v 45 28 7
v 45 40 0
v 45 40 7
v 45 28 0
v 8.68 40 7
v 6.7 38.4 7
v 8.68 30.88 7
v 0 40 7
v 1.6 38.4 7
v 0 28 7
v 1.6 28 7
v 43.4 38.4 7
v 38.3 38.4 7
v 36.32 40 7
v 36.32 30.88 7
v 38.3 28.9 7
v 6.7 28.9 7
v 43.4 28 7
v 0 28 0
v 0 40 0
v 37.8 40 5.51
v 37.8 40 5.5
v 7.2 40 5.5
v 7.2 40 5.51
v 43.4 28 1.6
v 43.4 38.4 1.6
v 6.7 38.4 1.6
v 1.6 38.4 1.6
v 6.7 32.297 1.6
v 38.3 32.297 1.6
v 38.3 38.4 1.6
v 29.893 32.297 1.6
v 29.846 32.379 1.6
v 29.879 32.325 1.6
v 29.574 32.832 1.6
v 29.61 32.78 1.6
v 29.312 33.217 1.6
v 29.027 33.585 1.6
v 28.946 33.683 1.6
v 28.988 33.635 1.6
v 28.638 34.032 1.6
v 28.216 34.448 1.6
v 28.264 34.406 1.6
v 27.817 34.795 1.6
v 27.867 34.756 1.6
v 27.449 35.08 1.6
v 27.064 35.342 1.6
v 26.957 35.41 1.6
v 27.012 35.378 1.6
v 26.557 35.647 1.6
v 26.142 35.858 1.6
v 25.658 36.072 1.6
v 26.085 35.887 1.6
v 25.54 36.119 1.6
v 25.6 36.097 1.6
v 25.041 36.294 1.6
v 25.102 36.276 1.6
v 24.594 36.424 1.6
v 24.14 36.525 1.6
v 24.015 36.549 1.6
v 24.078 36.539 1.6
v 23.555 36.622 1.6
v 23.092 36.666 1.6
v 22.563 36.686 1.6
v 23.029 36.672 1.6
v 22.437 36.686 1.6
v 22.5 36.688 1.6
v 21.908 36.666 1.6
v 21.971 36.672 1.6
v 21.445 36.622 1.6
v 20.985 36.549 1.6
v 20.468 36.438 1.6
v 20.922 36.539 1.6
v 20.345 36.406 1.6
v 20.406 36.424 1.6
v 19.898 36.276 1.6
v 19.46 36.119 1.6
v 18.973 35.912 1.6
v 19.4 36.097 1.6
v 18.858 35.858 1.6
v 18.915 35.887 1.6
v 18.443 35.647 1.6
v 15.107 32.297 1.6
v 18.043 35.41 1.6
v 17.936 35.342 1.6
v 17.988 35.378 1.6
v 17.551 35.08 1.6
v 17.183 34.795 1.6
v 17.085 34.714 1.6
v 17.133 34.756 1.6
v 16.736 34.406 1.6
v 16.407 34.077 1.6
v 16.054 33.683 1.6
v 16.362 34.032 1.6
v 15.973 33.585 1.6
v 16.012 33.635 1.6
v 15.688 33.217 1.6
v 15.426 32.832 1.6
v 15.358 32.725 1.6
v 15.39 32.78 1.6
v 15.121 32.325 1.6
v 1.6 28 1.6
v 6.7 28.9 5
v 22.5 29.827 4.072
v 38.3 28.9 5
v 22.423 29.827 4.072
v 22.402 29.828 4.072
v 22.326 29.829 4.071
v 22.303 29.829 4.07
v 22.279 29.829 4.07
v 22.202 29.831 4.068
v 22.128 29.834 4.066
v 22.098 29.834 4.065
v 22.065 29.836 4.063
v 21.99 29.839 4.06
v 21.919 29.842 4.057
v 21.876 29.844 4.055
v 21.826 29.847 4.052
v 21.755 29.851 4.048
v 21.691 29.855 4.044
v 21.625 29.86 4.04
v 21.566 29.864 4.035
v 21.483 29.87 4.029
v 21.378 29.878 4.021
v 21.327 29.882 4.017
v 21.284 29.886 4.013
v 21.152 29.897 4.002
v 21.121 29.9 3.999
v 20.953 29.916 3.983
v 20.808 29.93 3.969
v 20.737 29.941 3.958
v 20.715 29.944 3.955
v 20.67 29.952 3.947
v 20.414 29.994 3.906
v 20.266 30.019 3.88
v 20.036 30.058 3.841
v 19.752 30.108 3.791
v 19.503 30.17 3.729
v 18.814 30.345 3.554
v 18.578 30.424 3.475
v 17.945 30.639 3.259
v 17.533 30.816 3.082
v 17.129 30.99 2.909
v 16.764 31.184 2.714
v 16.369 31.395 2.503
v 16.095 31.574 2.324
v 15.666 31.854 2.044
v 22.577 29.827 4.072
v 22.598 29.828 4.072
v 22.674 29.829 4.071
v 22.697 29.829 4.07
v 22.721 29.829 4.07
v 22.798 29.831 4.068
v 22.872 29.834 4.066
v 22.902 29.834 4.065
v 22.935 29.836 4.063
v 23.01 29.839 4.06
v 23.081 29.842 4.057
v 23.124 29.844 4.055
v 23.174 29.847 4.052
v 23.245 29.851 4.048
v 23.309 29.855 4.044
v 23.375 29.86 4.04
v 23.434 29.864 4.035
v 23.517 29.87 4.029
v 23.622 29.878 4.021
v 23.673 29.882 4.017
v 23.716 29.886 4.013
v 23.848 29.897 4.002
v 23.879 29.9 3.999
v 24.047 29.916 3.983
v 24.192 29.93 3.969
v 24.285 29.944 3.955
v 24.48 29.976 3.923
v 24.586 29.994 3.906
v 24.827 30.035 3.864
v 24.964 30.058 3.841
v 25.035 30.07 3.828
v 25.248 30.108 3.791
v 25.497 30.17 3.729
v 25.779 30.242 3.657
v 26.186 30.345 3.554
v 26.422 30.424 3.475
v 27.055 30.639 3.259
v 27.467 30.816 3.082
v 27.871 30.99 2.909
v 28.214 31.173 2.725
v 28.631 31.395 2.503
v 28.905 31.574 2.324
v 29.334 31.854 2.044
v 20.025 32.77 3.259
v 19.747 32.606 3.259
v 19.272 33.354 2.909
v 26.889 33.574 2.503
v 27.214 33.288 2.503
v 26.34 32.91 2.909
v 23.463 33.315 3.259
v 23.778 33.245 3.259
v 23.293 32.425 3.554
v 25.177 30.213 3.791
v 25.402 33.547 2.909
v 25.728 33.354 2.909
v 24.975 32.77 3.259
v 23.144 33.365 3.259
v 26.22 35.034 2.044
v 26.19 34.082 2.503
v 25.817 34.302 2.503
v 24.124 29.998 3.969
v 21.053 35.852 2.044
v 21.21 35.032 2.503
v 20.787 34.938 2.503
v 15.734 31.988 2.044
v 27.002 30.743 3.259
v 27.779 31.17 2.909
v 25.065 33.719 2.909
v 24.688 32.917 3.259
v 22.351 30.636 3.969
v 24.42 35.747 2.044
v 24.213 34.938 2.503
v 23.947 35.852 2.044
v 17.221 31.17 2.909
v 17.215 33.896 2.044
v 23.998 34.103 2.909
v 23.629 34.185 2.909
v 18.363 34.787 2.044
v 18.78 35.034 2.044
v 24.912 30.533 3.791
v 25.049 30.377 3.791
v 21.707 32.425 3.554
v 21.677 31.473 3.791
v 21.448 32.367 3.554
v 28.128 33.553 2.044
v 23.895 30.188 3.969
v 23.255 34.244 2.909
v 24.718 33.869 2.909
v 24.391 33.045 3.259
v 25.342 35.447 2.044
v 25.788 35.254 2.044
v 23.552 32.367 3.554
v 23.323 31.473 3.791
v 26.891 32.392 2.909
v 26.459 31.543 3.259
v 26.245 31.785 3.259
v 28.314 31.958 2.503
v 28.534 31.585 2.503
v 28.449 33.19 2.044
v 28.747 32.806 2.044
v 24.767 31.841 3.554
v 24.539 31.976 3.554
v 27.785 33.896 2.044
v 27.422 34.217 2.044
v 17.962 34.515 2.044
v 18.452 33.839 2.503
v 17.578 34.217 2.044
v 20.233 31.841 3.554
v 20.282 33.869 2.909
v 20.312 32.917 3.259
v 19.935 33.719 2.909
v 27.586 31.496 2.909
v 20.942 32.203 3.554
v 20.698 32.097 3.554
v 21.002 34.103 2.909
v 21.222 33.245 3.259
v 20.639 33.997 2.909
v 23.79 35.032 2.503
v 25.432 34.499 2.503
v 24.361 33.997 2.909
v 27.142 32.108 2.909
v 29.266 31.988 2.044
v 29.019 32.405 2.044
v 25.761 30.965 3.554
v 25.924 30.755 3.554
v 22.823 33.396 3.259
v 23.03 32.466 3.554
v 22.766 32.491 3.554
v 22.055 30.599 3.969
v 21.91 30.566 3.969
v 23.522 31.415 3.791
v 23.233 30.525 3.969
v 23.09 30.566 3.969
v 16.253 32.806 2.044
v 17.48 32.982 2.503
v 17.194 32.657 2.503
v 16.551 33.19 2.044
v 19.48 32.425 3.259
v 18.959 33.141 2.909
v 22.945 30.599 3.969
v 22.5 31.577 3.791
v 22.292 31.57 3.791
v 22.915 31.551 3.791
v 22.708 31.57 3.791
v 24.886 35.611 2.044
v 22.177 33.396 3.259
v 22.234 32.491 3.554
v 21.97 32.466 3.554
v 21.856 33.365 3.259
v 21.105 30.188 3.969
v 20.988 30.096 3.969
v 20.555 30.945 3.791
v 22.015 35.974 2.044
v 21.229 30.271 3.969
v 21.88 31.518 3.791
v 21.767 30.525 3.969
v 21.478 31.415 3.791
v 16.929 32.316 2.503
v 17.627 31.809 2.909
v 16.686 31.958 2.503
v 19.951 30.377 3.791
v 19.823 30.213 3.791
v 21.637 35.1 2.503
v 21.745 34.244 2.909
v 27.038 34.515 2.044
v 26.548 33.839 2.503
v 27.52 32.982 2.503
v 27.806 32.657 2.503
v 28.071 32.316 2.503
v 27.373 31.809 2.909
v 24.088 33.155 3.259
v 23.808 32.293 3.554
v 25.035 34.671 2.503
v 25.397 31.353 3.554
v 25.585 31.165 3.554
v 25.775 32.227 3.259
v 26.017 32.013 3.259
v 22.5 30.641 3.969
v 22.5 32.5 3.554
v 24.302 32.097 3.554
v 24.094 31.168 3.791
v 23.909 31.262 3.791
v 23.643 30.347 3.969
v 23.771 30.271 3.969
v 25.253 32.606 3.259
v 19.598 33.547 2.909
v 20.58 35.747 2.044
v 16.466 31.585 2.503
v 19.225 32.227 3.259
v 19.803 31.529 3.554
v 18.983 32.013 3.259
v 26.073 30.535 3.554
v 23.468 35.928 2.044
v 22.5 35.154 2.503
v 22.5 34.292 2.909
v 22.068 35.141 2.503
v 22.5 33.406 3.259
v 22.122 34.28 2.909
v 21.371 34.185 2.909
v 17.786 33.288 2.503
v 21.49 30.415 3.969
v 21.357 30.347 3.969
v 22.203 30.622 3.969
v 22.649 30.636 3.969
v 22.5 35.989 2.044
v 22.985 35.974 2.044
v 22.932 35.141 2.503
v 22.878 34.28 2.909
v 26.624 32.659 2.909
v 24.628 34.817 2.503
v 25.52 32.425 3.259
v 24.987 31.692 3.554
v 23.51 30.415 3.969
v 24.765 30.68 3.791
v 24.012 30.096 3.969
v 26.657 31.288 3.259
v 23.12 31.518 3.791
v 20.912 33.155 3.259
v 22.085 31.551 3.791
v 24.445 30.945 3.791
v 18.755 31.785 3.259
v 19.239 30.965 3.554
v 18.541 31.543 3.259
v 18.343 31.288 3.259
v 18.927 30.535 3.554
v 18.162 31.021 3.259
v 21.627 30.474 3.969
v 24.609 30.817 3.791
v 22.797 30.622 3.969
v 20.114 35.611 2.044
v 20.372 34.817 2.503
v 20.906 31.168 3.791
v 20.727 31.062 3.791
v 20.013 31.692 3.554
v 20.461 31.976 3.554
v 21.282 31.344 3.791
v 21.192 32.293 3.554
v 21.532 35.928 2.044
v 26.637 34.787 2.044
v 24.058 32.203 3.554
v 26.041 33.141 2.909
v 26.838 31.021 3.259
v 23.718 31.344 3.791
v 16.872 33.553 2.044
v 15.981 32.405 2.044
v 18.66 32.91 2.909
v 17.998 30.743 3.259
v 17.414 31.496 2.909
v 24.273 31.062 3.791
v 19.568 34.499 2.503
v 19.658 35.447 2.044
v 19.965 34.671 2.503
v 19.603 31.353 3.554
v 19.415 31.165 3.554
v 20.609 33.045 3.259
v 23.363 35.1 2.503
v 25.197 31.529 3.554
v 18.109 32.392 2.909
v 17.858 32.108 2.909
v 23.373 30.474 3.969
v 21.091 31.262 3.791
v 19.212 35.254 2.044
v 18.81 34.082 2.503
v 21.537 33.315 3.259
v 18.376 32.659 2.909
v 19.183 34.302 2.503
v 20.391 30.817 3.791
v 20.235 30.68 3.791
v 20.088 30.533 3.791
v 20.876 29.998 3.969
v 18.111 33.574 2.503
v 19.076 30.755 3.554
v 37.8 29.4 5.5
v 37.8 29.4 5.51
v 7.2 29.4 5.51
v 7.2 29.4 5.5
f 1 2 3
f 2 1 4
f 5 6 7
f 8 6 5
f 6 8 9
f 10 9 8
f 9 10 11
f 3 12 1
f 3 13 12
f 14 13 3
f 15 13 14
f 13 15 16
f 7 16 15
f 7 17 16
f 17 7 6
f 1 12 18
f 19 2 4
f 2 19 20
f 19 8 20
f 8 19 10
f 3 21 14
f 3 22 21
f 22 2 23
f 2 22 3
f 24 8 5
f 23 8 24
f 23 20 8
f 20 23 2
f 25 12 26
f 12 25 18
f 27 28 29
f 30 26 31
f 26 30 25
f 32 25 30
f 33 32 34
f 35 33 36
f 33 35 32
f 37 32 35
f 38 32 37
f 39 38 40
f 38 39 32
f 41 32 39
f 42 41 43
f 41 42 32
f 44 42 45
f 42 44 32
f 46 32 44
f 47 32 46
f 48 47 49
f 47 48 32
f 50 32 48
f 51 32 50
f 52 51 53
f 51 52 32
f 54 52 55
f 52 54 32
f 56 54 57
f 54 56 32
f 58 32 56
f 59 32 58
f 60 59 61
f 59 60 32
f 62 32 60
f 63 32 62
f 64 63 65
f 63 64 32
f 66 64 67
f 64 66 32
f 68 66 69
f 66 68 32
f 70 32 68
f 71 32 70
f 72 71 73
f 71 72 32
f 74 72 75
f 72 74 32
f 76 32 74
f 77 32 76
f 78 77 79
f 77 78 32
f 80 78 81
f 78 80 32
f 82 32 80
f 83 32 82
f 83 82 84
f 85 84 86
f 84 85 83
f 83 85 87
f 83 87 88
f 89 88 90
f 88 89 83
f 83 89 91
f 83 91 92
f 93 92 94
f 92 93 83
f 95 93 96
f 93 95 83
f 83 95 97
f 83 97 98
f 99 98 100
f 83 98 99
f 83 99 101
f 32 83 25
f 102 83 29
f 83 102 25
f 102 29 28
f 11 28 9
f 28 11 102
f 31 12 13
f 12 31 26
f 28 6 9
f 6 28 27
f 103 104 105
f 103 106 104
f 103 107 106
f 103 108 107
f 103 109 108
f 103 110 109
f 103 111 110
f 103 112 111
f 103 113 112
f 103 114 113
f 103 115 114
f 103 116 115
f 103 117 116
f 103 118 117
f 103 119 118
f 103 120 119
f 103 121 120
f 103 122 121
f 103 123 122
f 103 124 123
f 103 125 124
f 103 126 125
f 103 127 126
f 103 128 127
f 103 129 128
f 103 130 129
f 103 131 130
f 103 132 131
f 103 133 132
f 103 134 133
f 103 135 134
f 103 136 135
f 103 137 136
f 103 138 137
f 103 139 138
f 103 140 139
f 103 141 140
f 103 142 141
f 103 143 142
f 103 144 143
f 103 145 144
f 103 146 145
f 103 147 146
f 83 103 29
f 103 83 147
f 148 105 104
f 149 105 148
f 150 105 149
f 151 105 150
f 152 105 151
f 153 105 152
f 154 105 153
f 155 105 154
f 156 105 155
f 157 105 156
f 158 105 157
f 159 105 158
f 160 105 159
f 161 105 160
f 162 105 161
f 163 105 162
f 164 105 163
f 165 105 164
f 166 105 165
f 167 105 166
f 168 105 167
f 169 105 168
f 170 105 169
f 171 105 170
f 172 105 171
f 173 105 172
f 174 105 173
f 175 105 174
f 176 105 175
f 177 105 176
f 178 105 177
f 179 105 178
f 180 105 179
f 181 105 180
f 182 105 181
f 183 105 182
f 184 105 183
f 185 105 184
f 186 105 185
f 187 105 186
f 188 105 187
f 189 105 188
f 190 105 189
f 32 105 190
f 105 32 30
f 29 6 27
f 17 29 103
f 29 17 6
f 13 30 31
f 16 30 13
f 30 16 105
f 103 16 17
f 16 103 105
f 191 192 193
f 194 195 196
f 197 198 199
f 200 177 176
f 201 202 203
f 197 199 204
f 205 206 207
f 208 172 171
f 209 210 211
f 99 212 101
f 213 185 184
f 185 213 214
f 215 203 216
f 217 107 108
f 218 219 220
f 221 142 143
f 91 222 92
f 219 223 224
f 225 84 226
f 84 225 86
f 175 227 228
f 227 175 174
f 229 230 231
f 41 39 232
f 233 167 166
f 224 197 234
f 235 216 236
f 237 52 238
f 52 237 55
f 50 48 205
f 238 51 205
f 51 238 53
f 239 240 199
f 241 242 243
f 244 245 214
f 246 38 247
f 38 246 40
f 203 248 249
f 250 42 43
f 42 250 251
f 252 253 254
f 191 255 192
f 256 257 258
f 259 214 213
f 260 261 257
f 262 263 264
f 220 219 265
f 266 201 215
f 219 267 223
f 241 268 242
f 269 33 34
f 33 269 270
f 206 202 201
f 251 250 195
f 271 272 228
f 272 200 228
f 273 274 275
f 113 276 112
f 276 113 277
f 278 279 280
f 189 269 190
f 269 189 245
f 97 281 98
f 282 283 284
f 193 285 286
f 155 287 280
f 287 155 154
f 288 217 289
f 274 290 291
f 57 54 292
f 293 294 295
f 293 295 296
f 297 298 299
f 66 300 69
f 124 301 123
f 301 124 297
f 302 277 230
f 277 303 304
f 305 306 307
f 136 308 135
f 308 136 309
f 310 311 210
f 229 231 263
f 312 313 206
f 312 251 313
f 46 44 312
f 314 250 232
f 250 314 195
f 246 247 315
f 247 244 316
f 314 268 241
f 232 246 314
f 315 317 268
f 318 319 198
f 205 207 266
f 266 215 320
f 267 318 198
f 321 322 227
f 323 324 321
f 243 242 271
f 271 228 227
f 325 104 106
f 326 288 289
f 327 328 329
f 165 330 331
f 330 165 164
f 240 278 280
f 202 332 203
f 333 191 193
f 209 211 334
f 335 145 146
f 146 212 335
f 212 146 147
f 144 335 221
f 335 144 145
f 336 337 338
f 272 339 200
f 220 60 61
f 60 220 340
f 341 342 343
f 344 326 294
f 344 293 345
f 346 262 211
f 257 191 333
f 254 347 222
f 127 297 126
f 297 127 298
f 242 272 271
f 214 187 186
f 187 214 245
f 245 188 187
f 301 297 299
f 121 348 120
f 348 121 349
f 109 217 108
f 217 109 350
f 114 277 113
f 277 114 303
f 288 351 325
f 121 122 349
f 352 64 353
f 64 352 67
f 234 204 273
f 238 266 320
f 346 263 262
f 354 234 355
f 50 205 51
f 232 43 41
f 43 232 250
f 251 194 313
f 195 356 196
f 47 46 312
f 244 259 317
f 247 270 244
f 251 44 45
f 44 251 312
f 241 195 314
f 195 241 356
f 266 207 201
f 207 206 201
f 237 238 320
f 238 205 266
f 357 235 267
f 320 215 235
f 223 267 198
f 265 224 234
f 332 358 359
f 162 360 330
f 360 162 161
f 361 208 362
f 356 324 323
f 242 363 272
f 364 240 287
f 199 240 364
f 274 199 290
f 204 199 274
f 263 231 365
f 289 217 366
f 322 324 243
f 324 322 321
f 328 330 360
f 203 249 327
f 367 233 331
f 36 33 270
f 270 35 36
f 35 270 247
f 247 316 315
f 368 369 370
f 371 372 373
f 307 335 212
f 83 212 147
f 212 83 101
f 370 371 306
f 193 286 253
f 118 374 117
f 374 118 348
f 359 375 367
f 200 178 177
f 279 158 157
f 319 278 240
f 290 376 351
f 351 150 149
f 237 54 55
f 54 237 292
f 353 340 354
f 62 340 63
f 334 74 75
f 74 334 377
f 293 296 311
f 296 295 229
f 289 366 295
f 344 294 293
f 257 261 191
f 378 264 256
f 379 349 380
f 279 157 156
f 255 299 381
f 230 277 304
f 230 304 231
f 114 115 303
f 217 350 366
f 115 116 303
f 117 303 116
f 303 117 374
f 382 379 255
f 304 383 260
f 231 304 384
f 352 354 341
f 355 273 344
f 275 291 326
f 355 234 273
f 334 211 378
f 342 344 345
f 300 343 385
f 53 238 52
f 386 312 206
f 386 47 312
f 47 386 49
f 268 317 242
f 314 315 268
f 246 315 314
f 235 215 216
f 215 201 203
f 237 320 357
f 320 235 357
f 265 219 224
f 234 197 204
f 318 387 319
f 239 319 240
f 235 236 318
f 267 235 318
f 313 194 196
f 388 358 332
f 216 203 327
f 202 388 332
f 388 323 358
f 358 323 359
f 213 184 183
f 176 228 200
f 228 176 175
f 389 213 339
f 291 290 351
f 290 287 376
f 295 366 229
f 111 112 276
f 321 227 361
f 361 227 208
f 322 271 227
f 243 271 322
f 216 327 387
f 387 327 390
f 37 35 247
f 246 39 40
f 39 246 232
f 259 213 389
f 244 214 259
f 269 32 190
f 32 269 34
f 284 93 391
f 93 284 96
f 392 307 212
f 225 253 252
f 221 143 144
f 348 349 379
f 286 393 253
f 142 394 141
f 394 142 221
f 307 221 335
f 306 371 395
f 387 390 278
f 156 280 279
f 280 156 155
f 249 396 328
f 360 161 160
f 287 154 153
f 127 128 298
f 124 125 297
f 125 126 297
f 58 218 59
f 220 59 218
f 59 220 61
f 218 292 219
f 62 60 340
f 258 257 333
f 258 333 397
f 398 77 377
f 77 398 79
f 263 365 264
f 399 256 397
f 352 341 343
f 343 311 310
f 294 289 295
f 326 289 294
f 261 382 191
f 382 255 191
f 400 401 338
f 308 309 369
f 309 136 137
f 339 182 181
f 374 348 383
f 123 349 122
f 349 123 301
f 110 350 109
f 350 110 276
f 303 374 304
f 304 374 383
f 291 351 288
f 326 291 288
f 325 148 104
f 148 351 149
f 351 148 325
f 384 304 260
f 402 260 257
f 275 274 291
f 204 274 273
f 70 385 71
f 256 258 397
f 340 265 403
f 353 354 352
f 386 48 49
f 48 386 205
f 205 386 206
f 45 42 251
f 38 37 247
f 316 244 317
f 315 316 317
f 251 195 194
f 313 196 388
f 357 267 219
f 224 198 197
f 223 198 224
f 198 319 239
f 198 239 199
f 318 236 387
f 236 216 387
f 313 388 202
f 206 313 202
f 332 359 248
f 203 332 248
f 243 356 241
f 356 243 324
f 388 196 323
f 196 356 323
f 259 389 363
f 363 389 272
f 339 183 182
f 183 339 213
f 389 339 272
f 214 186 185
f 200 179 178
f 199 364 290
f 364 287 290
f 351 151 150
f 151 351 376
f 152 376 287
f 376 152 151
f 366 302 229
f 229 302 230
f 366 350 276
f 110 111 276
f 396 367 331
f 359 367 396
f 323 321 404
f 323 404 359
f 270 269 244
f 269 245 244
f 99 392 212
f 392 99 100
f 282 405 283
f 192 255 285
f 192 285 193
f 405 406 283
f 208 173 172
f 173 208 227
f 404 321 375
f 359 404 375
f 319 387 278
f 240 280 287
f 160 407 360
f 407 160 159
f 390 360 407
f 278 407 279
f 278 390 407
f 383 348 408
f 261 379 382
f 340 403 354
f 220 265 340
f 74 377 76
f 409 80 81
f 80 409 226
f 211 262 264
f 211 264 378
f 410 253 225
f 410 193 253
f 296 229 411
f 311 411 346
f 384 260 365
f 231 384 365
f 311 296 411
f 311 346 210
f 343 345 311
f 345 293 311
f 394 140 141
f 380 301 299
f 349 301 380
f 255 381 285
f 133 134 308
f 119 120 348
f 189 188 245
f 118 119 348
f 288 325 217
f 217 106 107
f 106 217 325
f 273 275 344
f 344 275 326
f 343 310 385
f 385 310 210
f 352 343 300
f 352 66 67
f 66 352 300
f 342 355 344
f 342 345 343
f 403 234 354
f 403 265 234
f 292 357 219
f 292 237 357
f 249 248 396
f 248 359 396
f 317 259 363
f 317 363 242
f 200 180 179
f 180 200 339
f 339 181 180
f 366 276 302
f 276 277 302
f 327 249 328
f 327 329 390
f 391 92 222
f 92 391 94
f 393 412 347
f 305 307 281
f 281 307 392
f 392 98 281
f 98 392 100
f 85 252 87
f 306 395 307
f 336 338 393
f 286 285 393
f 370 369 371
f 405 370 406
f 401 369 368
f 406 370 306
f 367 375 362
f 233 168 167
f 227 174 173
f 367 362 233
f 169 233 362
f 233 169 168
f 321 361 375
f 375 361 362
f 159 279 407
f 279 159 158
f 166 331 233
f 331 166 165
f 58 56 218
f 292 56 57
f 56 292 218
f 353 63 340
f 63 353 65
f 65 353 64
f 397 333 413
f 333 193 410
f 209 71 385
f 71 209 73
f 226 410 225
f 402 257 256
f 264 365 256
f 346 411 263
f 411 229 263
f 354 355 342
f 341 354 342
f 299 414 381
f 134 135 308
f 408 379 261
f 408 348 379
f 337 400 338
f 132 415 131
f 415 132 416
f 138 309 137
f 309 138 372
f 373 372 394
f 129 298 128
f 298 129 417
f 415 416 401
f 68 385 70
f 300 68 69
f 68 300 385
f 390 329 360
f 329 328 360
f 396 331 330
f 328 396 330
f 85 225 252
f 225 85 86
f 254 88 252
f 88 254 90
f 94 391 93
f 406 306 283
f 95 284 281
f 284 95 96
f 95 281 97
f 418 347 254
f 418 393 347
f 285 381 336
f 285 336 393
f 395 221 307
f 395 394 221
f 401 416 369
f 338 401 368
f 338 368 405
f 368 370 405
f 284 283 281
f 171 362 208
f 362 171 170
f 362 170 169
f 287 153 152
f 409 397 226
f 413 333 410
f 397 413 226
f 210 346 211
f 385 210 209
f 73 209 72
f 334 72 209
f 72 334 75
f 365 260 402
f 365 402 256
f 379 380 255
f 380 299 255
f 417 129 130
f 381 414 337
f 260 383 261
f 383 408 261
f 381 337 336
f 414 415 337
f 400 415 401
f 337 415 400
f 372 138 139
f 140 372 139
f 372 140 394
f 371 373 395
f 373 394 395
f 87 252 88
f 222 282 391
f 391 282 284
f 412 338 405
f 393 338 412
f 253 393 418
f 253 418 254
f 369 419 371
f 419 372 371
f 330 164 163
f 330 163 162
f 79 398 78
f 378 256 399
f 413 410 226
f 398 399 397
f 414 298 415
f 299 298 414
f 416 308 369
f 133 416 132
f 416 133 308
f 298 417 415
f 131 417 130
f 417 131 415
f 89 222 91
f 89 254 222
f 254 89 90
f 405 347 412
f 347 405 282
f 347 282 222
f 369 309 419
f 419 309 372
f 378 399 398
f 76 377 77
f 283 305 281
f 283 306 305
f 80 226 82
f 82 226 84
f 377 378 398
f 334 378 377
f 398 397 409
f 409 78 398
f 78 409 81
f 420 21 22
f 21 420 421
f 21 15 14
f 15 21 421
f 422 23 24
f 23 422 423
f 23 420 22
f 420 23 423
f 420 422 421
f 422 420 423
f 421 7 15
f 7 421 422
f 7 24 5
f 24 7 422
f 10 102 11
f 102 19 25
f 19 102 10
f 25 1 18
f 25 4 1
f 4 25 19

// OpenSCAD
// file: bezier.scad
deltat = 0.05;
    
function cubic_bezier(p0,p1,p2,p3) = [for (t=[0:deltat:1+deltat]) pow(1-t,3)*p0+3*pow((1-t),2)*t*p1+3*(1-t)*pow(t,2)*p2+pow(t,3)*p3];

function project_point(pa, pb) =
    [for (i = [0:1]) pb[i]+(pb[i]-pa[i])];
    
module polyline(points, index, w) {
    if(index < len(points)) {
        line(points[index - 1], points[index],w);
        polyline(points, index + 1, w);
    }
}

module line(p1,p2,w) {
    hull() {
        translate(p1) circle(r=w,$fn=20);
        translate(p2) circle(r=w,$fn=20);
    }
}
// main file
include <bezier.scad>;

$fn=50;
solid_thick = 10;

length_min = 348;
length_mid = 351;
length_max = 355;

length_min_offset = length_max - length_min;
length_mid_offset = length_max - length_mid;
width = 235;
handle_side_min = 50;
handle_side_max = 60;
depth = 70;
fix = 0.01;
gap = 0.6;



module reduce(padding) {
    
    difference() {
        children();
        minkowski() {        
            difference() {
                minkowski() {
                    children();
                    cylinder(r=padding, height=padding, center=true);
                };
                children();
            };
            cylinder(r=padding, height=fix, center=true);
        }
    }
}

module reduce_y(padding) {
    difference() {
        children();
        minkowski() {        
            difference() {
                minkowski() {
                    children();
                    cylinder(r=padding, height=padding, center=true);
                };
                children();
            };
            cube([fix, padding*2, fix], center=true);
        }
    }
}

module solid() {
    translate([-solid_thick,-solid_thick, -solid_thick])
    cube([width+solid_thick*2,length_max+solid_thick*2, depth + solid_thick]);
}

module void() {
    translate([20, length_min_offset,0])
    cube([width-40, length_min-20, depth+fix]);
  
    translate([0, length_min_offset+20,0])
    cube([width, length_min-20, depth+fix]);
      
}


p0 = [handle_side_min,0];
p1 = [handle_side_min+5,0];
p2 = [handle_side_max-5,length_min_offset];
p3 = [handle_side_max,length_min_offset];


module smooth() {
    linear_extrude(height=depth+10+fix*3)
    polygon(concat(
        cubic_bezier(
            [0,length_mid_offset+1],
            [0,length_mid_offset-1],           
            [handle_side_min-10,0],
            [handle_side_min,0]
        ),
        cubic_bezier(
            [handle_side_min,0],
            [handle_side_min+5,0],
            [handle_side_max-5,length_min_offset],
            [handle_side_max,length_min_offset]    
        ),
        [
            [handle_side_max+10,length_min_offset],
            [handle_side_max+10,length_min_offset+70],
            [0,length_min_offset+70]
        ])
    );
}

module smooth_old() {
    linear_extrude(height=depth+fix)
    polygon(concat([
            [0,length_mid_offset]
        ],
        cubic_bezier(
            [handle_side_min,0],
            [handle_side_min+5,0],
            [handle_side_max-5,length_min_offset],
            [handle_side_max,length_min_offset]    
        ),
        [
            [handle_side_max+10,length_min_offset],
            [handle_side_max+10,length_min_offset+10],
            [0,length_min_offset+10]
        ])
    );
}

module cassetto() {
    difference() {
        solid();
        void();
        smooth();
        translate([width,0,0])
        mirror([1,0,0])
        smooth();
    }
}

    


box_length = 50;
box_width = 50;
box_depth = 50;
box_bottom_thick = 1.6;
box_wall_thick = 1.6;

box_hang_label_width = 30;
box_hang_label_length = 10;
box_hang_label_margin = 2;
box_hang_play = 0.3;
box_hang_eps = 1.5;
box_hang_width = box_hang_label_width+box_hang_label_margin*2-box_hang_eps*2+box_hang_play*2;
box_hang_length = box_hang_label_length+box_hang_label_margin-box_hang_eps+box_hang_play*2;
box_hang_thick = 2;




module box_hang_solid() {
    difference() {
        hull() {
            translate([0,0,-box_hang_thick])
            cube([box_hang_width,box_hang_length,box_hang_thick]);
            translate([0,box_hang_length-fix, -box_hang_thick-box_hang_length])
            cube([box_hang_width,fix,fix]);
        };
        translate([box_hang_width/2,-box_hang_width*0.02,-box_hang_width*0.57])
        sphere(box_hang_width*0.48, $fn=100); 
    }
}

module box_hang_void() {
    hull() {
        translate([box_hang_label_margin, +box_hang_label_margin,fix])
        cube([box_hang_width-box_hang_label_margin*2, box_hang_length, fix]);
        translate([
            box_hang_label_margin-box_hang_eps,
            +box_hang_label_margin-box_hang_eps,
            -box_hang_eps
        ])
        cube([
            box_hang_width-box_hang_label_margin*2+box_hang_eps*2,
            box_hang_length,
            fix
        ]);    
    }
}

module box_hang() {
    difference() {
        box_hang_solid();
        box_hang_void();
    }
}

module box_main(box_width, box_length, box_depth) {
    difference() {
        cube([box_width, box_length, box_depth]);

        translate([box_wall_thick,box_wall_thick,box_bottom_thick])
        cube([box_width-box_wall_thick*2, box_length-box_wall_thick*2, box_depth]);
    };
}

module box_main_outer(box_width, box_length, box_depth) {
    module solid() {
        intersection() {
            translate([gap,-gap,0])
            cube([box_width, box_length, box_depth]);
            reduce(gap)
            smooth();
        }
    }
    
    translate([-gap,gap,0])
    difference() {
        solid();

        translate([0,0,box_bottom_thick])
        reduce(box_wall_thick)
        solid();    
    };
}



module box(box_width, box_length, box_depth) {
    module move_hang() {
        translate([
            (box_width-box_hang_width)/2,
            box_length-box_hang_length,
            box_depth
        ])
        children();
    }

    
    difference() {
        union() {
            box_main(box_width, box_length, box_depth);
            move_hang()
            box_hang_solid();
        };
        move_hang()
        box_hang_void();
    }
}

module box_outer(box_width, box_length, box_depth) {
    module move_hang() {
        translate([
            (box_width-box_hang_width)/2,
            box_length-box_hang_length,
            box_depth
        ])
        children();
    }

    
    difference() {
        union() {
            box_main_outer(box_width, box_length, box_depth);
            move_hang()
            box_hang_solid();
        };
        move_hang()
        box_hang_void();
    }
}

box_width_25 = (width-gap*5)/4;
box_length_20 = (length_max-gap*6)/5;

box_length_20_bc = length_min-gap*6-box_length_20*4 - gap;

module box_grid() {
    
    for ( i = [0:3]) {
        for ( j = [0:3]) {
            x_shift = gap+(box_width_25+gap)*j;
            y_shift = gap+(box_length_20+gap)*i;
            
            translate([x_shift, length_max-box_length_20-y_shift,0])
            box(box_width_25, box_length_20, depth);
        }
    }
    x1_shift = gap+(box_width_25+gap)*0;
    y1_shift = gap+(box_length_20+gap)*4;
    
    translate([x1_shift, length_max-box_length_20-y1_shift,0])
    box_outer(box_width_25, box_length_20, depth);
    
    x2_shift = gap+(box_width_25+gap)*3;
    y2_shift = gap+(box_length_20+gap)*4;
    
    translate([box_width_25+x2_shift, length_max-box_length_20-y2_shift,0])
    mirror([1,0,0])
    box_outer(box_width_25, box_length_20, depth);
    
    x3_shift = gap+(box_width_25+gap)*1;
    y3_shift = gap+(box_length_20+gap)*4;
    
    translate([x3_shift, length_max-box_length_20_bc-y3_shift,0])
    box(box_width_25, box_length_20_bc, depth);
    
    x4_shift = gap+(box_width_25+gap)*2;
    y4_shift = gap+(box_length_20+gap)*4;
    
    translate([x4_shift, length_max-box_length_20_bc-y4_shift,0])
    box(box_width_25, box_length_20_bc, depth);
    
}



//translate([0,0,0.5])
//box_grid();

//cassetto();

module box_test() {
    difference() {
        box(45,40,7);
        translate([-10,-2,-5])
        cube([70,30,30]);   
       translate([0,0,-130]) 
        cube([70,130,130]);    
    }
}

box_test();
//box(box_width_25, box_length_20, depth);
//box_outer(box_width_25, box_length_20, depth);

//box_main_outer(box_width_25, box_length_20, depth);






    
